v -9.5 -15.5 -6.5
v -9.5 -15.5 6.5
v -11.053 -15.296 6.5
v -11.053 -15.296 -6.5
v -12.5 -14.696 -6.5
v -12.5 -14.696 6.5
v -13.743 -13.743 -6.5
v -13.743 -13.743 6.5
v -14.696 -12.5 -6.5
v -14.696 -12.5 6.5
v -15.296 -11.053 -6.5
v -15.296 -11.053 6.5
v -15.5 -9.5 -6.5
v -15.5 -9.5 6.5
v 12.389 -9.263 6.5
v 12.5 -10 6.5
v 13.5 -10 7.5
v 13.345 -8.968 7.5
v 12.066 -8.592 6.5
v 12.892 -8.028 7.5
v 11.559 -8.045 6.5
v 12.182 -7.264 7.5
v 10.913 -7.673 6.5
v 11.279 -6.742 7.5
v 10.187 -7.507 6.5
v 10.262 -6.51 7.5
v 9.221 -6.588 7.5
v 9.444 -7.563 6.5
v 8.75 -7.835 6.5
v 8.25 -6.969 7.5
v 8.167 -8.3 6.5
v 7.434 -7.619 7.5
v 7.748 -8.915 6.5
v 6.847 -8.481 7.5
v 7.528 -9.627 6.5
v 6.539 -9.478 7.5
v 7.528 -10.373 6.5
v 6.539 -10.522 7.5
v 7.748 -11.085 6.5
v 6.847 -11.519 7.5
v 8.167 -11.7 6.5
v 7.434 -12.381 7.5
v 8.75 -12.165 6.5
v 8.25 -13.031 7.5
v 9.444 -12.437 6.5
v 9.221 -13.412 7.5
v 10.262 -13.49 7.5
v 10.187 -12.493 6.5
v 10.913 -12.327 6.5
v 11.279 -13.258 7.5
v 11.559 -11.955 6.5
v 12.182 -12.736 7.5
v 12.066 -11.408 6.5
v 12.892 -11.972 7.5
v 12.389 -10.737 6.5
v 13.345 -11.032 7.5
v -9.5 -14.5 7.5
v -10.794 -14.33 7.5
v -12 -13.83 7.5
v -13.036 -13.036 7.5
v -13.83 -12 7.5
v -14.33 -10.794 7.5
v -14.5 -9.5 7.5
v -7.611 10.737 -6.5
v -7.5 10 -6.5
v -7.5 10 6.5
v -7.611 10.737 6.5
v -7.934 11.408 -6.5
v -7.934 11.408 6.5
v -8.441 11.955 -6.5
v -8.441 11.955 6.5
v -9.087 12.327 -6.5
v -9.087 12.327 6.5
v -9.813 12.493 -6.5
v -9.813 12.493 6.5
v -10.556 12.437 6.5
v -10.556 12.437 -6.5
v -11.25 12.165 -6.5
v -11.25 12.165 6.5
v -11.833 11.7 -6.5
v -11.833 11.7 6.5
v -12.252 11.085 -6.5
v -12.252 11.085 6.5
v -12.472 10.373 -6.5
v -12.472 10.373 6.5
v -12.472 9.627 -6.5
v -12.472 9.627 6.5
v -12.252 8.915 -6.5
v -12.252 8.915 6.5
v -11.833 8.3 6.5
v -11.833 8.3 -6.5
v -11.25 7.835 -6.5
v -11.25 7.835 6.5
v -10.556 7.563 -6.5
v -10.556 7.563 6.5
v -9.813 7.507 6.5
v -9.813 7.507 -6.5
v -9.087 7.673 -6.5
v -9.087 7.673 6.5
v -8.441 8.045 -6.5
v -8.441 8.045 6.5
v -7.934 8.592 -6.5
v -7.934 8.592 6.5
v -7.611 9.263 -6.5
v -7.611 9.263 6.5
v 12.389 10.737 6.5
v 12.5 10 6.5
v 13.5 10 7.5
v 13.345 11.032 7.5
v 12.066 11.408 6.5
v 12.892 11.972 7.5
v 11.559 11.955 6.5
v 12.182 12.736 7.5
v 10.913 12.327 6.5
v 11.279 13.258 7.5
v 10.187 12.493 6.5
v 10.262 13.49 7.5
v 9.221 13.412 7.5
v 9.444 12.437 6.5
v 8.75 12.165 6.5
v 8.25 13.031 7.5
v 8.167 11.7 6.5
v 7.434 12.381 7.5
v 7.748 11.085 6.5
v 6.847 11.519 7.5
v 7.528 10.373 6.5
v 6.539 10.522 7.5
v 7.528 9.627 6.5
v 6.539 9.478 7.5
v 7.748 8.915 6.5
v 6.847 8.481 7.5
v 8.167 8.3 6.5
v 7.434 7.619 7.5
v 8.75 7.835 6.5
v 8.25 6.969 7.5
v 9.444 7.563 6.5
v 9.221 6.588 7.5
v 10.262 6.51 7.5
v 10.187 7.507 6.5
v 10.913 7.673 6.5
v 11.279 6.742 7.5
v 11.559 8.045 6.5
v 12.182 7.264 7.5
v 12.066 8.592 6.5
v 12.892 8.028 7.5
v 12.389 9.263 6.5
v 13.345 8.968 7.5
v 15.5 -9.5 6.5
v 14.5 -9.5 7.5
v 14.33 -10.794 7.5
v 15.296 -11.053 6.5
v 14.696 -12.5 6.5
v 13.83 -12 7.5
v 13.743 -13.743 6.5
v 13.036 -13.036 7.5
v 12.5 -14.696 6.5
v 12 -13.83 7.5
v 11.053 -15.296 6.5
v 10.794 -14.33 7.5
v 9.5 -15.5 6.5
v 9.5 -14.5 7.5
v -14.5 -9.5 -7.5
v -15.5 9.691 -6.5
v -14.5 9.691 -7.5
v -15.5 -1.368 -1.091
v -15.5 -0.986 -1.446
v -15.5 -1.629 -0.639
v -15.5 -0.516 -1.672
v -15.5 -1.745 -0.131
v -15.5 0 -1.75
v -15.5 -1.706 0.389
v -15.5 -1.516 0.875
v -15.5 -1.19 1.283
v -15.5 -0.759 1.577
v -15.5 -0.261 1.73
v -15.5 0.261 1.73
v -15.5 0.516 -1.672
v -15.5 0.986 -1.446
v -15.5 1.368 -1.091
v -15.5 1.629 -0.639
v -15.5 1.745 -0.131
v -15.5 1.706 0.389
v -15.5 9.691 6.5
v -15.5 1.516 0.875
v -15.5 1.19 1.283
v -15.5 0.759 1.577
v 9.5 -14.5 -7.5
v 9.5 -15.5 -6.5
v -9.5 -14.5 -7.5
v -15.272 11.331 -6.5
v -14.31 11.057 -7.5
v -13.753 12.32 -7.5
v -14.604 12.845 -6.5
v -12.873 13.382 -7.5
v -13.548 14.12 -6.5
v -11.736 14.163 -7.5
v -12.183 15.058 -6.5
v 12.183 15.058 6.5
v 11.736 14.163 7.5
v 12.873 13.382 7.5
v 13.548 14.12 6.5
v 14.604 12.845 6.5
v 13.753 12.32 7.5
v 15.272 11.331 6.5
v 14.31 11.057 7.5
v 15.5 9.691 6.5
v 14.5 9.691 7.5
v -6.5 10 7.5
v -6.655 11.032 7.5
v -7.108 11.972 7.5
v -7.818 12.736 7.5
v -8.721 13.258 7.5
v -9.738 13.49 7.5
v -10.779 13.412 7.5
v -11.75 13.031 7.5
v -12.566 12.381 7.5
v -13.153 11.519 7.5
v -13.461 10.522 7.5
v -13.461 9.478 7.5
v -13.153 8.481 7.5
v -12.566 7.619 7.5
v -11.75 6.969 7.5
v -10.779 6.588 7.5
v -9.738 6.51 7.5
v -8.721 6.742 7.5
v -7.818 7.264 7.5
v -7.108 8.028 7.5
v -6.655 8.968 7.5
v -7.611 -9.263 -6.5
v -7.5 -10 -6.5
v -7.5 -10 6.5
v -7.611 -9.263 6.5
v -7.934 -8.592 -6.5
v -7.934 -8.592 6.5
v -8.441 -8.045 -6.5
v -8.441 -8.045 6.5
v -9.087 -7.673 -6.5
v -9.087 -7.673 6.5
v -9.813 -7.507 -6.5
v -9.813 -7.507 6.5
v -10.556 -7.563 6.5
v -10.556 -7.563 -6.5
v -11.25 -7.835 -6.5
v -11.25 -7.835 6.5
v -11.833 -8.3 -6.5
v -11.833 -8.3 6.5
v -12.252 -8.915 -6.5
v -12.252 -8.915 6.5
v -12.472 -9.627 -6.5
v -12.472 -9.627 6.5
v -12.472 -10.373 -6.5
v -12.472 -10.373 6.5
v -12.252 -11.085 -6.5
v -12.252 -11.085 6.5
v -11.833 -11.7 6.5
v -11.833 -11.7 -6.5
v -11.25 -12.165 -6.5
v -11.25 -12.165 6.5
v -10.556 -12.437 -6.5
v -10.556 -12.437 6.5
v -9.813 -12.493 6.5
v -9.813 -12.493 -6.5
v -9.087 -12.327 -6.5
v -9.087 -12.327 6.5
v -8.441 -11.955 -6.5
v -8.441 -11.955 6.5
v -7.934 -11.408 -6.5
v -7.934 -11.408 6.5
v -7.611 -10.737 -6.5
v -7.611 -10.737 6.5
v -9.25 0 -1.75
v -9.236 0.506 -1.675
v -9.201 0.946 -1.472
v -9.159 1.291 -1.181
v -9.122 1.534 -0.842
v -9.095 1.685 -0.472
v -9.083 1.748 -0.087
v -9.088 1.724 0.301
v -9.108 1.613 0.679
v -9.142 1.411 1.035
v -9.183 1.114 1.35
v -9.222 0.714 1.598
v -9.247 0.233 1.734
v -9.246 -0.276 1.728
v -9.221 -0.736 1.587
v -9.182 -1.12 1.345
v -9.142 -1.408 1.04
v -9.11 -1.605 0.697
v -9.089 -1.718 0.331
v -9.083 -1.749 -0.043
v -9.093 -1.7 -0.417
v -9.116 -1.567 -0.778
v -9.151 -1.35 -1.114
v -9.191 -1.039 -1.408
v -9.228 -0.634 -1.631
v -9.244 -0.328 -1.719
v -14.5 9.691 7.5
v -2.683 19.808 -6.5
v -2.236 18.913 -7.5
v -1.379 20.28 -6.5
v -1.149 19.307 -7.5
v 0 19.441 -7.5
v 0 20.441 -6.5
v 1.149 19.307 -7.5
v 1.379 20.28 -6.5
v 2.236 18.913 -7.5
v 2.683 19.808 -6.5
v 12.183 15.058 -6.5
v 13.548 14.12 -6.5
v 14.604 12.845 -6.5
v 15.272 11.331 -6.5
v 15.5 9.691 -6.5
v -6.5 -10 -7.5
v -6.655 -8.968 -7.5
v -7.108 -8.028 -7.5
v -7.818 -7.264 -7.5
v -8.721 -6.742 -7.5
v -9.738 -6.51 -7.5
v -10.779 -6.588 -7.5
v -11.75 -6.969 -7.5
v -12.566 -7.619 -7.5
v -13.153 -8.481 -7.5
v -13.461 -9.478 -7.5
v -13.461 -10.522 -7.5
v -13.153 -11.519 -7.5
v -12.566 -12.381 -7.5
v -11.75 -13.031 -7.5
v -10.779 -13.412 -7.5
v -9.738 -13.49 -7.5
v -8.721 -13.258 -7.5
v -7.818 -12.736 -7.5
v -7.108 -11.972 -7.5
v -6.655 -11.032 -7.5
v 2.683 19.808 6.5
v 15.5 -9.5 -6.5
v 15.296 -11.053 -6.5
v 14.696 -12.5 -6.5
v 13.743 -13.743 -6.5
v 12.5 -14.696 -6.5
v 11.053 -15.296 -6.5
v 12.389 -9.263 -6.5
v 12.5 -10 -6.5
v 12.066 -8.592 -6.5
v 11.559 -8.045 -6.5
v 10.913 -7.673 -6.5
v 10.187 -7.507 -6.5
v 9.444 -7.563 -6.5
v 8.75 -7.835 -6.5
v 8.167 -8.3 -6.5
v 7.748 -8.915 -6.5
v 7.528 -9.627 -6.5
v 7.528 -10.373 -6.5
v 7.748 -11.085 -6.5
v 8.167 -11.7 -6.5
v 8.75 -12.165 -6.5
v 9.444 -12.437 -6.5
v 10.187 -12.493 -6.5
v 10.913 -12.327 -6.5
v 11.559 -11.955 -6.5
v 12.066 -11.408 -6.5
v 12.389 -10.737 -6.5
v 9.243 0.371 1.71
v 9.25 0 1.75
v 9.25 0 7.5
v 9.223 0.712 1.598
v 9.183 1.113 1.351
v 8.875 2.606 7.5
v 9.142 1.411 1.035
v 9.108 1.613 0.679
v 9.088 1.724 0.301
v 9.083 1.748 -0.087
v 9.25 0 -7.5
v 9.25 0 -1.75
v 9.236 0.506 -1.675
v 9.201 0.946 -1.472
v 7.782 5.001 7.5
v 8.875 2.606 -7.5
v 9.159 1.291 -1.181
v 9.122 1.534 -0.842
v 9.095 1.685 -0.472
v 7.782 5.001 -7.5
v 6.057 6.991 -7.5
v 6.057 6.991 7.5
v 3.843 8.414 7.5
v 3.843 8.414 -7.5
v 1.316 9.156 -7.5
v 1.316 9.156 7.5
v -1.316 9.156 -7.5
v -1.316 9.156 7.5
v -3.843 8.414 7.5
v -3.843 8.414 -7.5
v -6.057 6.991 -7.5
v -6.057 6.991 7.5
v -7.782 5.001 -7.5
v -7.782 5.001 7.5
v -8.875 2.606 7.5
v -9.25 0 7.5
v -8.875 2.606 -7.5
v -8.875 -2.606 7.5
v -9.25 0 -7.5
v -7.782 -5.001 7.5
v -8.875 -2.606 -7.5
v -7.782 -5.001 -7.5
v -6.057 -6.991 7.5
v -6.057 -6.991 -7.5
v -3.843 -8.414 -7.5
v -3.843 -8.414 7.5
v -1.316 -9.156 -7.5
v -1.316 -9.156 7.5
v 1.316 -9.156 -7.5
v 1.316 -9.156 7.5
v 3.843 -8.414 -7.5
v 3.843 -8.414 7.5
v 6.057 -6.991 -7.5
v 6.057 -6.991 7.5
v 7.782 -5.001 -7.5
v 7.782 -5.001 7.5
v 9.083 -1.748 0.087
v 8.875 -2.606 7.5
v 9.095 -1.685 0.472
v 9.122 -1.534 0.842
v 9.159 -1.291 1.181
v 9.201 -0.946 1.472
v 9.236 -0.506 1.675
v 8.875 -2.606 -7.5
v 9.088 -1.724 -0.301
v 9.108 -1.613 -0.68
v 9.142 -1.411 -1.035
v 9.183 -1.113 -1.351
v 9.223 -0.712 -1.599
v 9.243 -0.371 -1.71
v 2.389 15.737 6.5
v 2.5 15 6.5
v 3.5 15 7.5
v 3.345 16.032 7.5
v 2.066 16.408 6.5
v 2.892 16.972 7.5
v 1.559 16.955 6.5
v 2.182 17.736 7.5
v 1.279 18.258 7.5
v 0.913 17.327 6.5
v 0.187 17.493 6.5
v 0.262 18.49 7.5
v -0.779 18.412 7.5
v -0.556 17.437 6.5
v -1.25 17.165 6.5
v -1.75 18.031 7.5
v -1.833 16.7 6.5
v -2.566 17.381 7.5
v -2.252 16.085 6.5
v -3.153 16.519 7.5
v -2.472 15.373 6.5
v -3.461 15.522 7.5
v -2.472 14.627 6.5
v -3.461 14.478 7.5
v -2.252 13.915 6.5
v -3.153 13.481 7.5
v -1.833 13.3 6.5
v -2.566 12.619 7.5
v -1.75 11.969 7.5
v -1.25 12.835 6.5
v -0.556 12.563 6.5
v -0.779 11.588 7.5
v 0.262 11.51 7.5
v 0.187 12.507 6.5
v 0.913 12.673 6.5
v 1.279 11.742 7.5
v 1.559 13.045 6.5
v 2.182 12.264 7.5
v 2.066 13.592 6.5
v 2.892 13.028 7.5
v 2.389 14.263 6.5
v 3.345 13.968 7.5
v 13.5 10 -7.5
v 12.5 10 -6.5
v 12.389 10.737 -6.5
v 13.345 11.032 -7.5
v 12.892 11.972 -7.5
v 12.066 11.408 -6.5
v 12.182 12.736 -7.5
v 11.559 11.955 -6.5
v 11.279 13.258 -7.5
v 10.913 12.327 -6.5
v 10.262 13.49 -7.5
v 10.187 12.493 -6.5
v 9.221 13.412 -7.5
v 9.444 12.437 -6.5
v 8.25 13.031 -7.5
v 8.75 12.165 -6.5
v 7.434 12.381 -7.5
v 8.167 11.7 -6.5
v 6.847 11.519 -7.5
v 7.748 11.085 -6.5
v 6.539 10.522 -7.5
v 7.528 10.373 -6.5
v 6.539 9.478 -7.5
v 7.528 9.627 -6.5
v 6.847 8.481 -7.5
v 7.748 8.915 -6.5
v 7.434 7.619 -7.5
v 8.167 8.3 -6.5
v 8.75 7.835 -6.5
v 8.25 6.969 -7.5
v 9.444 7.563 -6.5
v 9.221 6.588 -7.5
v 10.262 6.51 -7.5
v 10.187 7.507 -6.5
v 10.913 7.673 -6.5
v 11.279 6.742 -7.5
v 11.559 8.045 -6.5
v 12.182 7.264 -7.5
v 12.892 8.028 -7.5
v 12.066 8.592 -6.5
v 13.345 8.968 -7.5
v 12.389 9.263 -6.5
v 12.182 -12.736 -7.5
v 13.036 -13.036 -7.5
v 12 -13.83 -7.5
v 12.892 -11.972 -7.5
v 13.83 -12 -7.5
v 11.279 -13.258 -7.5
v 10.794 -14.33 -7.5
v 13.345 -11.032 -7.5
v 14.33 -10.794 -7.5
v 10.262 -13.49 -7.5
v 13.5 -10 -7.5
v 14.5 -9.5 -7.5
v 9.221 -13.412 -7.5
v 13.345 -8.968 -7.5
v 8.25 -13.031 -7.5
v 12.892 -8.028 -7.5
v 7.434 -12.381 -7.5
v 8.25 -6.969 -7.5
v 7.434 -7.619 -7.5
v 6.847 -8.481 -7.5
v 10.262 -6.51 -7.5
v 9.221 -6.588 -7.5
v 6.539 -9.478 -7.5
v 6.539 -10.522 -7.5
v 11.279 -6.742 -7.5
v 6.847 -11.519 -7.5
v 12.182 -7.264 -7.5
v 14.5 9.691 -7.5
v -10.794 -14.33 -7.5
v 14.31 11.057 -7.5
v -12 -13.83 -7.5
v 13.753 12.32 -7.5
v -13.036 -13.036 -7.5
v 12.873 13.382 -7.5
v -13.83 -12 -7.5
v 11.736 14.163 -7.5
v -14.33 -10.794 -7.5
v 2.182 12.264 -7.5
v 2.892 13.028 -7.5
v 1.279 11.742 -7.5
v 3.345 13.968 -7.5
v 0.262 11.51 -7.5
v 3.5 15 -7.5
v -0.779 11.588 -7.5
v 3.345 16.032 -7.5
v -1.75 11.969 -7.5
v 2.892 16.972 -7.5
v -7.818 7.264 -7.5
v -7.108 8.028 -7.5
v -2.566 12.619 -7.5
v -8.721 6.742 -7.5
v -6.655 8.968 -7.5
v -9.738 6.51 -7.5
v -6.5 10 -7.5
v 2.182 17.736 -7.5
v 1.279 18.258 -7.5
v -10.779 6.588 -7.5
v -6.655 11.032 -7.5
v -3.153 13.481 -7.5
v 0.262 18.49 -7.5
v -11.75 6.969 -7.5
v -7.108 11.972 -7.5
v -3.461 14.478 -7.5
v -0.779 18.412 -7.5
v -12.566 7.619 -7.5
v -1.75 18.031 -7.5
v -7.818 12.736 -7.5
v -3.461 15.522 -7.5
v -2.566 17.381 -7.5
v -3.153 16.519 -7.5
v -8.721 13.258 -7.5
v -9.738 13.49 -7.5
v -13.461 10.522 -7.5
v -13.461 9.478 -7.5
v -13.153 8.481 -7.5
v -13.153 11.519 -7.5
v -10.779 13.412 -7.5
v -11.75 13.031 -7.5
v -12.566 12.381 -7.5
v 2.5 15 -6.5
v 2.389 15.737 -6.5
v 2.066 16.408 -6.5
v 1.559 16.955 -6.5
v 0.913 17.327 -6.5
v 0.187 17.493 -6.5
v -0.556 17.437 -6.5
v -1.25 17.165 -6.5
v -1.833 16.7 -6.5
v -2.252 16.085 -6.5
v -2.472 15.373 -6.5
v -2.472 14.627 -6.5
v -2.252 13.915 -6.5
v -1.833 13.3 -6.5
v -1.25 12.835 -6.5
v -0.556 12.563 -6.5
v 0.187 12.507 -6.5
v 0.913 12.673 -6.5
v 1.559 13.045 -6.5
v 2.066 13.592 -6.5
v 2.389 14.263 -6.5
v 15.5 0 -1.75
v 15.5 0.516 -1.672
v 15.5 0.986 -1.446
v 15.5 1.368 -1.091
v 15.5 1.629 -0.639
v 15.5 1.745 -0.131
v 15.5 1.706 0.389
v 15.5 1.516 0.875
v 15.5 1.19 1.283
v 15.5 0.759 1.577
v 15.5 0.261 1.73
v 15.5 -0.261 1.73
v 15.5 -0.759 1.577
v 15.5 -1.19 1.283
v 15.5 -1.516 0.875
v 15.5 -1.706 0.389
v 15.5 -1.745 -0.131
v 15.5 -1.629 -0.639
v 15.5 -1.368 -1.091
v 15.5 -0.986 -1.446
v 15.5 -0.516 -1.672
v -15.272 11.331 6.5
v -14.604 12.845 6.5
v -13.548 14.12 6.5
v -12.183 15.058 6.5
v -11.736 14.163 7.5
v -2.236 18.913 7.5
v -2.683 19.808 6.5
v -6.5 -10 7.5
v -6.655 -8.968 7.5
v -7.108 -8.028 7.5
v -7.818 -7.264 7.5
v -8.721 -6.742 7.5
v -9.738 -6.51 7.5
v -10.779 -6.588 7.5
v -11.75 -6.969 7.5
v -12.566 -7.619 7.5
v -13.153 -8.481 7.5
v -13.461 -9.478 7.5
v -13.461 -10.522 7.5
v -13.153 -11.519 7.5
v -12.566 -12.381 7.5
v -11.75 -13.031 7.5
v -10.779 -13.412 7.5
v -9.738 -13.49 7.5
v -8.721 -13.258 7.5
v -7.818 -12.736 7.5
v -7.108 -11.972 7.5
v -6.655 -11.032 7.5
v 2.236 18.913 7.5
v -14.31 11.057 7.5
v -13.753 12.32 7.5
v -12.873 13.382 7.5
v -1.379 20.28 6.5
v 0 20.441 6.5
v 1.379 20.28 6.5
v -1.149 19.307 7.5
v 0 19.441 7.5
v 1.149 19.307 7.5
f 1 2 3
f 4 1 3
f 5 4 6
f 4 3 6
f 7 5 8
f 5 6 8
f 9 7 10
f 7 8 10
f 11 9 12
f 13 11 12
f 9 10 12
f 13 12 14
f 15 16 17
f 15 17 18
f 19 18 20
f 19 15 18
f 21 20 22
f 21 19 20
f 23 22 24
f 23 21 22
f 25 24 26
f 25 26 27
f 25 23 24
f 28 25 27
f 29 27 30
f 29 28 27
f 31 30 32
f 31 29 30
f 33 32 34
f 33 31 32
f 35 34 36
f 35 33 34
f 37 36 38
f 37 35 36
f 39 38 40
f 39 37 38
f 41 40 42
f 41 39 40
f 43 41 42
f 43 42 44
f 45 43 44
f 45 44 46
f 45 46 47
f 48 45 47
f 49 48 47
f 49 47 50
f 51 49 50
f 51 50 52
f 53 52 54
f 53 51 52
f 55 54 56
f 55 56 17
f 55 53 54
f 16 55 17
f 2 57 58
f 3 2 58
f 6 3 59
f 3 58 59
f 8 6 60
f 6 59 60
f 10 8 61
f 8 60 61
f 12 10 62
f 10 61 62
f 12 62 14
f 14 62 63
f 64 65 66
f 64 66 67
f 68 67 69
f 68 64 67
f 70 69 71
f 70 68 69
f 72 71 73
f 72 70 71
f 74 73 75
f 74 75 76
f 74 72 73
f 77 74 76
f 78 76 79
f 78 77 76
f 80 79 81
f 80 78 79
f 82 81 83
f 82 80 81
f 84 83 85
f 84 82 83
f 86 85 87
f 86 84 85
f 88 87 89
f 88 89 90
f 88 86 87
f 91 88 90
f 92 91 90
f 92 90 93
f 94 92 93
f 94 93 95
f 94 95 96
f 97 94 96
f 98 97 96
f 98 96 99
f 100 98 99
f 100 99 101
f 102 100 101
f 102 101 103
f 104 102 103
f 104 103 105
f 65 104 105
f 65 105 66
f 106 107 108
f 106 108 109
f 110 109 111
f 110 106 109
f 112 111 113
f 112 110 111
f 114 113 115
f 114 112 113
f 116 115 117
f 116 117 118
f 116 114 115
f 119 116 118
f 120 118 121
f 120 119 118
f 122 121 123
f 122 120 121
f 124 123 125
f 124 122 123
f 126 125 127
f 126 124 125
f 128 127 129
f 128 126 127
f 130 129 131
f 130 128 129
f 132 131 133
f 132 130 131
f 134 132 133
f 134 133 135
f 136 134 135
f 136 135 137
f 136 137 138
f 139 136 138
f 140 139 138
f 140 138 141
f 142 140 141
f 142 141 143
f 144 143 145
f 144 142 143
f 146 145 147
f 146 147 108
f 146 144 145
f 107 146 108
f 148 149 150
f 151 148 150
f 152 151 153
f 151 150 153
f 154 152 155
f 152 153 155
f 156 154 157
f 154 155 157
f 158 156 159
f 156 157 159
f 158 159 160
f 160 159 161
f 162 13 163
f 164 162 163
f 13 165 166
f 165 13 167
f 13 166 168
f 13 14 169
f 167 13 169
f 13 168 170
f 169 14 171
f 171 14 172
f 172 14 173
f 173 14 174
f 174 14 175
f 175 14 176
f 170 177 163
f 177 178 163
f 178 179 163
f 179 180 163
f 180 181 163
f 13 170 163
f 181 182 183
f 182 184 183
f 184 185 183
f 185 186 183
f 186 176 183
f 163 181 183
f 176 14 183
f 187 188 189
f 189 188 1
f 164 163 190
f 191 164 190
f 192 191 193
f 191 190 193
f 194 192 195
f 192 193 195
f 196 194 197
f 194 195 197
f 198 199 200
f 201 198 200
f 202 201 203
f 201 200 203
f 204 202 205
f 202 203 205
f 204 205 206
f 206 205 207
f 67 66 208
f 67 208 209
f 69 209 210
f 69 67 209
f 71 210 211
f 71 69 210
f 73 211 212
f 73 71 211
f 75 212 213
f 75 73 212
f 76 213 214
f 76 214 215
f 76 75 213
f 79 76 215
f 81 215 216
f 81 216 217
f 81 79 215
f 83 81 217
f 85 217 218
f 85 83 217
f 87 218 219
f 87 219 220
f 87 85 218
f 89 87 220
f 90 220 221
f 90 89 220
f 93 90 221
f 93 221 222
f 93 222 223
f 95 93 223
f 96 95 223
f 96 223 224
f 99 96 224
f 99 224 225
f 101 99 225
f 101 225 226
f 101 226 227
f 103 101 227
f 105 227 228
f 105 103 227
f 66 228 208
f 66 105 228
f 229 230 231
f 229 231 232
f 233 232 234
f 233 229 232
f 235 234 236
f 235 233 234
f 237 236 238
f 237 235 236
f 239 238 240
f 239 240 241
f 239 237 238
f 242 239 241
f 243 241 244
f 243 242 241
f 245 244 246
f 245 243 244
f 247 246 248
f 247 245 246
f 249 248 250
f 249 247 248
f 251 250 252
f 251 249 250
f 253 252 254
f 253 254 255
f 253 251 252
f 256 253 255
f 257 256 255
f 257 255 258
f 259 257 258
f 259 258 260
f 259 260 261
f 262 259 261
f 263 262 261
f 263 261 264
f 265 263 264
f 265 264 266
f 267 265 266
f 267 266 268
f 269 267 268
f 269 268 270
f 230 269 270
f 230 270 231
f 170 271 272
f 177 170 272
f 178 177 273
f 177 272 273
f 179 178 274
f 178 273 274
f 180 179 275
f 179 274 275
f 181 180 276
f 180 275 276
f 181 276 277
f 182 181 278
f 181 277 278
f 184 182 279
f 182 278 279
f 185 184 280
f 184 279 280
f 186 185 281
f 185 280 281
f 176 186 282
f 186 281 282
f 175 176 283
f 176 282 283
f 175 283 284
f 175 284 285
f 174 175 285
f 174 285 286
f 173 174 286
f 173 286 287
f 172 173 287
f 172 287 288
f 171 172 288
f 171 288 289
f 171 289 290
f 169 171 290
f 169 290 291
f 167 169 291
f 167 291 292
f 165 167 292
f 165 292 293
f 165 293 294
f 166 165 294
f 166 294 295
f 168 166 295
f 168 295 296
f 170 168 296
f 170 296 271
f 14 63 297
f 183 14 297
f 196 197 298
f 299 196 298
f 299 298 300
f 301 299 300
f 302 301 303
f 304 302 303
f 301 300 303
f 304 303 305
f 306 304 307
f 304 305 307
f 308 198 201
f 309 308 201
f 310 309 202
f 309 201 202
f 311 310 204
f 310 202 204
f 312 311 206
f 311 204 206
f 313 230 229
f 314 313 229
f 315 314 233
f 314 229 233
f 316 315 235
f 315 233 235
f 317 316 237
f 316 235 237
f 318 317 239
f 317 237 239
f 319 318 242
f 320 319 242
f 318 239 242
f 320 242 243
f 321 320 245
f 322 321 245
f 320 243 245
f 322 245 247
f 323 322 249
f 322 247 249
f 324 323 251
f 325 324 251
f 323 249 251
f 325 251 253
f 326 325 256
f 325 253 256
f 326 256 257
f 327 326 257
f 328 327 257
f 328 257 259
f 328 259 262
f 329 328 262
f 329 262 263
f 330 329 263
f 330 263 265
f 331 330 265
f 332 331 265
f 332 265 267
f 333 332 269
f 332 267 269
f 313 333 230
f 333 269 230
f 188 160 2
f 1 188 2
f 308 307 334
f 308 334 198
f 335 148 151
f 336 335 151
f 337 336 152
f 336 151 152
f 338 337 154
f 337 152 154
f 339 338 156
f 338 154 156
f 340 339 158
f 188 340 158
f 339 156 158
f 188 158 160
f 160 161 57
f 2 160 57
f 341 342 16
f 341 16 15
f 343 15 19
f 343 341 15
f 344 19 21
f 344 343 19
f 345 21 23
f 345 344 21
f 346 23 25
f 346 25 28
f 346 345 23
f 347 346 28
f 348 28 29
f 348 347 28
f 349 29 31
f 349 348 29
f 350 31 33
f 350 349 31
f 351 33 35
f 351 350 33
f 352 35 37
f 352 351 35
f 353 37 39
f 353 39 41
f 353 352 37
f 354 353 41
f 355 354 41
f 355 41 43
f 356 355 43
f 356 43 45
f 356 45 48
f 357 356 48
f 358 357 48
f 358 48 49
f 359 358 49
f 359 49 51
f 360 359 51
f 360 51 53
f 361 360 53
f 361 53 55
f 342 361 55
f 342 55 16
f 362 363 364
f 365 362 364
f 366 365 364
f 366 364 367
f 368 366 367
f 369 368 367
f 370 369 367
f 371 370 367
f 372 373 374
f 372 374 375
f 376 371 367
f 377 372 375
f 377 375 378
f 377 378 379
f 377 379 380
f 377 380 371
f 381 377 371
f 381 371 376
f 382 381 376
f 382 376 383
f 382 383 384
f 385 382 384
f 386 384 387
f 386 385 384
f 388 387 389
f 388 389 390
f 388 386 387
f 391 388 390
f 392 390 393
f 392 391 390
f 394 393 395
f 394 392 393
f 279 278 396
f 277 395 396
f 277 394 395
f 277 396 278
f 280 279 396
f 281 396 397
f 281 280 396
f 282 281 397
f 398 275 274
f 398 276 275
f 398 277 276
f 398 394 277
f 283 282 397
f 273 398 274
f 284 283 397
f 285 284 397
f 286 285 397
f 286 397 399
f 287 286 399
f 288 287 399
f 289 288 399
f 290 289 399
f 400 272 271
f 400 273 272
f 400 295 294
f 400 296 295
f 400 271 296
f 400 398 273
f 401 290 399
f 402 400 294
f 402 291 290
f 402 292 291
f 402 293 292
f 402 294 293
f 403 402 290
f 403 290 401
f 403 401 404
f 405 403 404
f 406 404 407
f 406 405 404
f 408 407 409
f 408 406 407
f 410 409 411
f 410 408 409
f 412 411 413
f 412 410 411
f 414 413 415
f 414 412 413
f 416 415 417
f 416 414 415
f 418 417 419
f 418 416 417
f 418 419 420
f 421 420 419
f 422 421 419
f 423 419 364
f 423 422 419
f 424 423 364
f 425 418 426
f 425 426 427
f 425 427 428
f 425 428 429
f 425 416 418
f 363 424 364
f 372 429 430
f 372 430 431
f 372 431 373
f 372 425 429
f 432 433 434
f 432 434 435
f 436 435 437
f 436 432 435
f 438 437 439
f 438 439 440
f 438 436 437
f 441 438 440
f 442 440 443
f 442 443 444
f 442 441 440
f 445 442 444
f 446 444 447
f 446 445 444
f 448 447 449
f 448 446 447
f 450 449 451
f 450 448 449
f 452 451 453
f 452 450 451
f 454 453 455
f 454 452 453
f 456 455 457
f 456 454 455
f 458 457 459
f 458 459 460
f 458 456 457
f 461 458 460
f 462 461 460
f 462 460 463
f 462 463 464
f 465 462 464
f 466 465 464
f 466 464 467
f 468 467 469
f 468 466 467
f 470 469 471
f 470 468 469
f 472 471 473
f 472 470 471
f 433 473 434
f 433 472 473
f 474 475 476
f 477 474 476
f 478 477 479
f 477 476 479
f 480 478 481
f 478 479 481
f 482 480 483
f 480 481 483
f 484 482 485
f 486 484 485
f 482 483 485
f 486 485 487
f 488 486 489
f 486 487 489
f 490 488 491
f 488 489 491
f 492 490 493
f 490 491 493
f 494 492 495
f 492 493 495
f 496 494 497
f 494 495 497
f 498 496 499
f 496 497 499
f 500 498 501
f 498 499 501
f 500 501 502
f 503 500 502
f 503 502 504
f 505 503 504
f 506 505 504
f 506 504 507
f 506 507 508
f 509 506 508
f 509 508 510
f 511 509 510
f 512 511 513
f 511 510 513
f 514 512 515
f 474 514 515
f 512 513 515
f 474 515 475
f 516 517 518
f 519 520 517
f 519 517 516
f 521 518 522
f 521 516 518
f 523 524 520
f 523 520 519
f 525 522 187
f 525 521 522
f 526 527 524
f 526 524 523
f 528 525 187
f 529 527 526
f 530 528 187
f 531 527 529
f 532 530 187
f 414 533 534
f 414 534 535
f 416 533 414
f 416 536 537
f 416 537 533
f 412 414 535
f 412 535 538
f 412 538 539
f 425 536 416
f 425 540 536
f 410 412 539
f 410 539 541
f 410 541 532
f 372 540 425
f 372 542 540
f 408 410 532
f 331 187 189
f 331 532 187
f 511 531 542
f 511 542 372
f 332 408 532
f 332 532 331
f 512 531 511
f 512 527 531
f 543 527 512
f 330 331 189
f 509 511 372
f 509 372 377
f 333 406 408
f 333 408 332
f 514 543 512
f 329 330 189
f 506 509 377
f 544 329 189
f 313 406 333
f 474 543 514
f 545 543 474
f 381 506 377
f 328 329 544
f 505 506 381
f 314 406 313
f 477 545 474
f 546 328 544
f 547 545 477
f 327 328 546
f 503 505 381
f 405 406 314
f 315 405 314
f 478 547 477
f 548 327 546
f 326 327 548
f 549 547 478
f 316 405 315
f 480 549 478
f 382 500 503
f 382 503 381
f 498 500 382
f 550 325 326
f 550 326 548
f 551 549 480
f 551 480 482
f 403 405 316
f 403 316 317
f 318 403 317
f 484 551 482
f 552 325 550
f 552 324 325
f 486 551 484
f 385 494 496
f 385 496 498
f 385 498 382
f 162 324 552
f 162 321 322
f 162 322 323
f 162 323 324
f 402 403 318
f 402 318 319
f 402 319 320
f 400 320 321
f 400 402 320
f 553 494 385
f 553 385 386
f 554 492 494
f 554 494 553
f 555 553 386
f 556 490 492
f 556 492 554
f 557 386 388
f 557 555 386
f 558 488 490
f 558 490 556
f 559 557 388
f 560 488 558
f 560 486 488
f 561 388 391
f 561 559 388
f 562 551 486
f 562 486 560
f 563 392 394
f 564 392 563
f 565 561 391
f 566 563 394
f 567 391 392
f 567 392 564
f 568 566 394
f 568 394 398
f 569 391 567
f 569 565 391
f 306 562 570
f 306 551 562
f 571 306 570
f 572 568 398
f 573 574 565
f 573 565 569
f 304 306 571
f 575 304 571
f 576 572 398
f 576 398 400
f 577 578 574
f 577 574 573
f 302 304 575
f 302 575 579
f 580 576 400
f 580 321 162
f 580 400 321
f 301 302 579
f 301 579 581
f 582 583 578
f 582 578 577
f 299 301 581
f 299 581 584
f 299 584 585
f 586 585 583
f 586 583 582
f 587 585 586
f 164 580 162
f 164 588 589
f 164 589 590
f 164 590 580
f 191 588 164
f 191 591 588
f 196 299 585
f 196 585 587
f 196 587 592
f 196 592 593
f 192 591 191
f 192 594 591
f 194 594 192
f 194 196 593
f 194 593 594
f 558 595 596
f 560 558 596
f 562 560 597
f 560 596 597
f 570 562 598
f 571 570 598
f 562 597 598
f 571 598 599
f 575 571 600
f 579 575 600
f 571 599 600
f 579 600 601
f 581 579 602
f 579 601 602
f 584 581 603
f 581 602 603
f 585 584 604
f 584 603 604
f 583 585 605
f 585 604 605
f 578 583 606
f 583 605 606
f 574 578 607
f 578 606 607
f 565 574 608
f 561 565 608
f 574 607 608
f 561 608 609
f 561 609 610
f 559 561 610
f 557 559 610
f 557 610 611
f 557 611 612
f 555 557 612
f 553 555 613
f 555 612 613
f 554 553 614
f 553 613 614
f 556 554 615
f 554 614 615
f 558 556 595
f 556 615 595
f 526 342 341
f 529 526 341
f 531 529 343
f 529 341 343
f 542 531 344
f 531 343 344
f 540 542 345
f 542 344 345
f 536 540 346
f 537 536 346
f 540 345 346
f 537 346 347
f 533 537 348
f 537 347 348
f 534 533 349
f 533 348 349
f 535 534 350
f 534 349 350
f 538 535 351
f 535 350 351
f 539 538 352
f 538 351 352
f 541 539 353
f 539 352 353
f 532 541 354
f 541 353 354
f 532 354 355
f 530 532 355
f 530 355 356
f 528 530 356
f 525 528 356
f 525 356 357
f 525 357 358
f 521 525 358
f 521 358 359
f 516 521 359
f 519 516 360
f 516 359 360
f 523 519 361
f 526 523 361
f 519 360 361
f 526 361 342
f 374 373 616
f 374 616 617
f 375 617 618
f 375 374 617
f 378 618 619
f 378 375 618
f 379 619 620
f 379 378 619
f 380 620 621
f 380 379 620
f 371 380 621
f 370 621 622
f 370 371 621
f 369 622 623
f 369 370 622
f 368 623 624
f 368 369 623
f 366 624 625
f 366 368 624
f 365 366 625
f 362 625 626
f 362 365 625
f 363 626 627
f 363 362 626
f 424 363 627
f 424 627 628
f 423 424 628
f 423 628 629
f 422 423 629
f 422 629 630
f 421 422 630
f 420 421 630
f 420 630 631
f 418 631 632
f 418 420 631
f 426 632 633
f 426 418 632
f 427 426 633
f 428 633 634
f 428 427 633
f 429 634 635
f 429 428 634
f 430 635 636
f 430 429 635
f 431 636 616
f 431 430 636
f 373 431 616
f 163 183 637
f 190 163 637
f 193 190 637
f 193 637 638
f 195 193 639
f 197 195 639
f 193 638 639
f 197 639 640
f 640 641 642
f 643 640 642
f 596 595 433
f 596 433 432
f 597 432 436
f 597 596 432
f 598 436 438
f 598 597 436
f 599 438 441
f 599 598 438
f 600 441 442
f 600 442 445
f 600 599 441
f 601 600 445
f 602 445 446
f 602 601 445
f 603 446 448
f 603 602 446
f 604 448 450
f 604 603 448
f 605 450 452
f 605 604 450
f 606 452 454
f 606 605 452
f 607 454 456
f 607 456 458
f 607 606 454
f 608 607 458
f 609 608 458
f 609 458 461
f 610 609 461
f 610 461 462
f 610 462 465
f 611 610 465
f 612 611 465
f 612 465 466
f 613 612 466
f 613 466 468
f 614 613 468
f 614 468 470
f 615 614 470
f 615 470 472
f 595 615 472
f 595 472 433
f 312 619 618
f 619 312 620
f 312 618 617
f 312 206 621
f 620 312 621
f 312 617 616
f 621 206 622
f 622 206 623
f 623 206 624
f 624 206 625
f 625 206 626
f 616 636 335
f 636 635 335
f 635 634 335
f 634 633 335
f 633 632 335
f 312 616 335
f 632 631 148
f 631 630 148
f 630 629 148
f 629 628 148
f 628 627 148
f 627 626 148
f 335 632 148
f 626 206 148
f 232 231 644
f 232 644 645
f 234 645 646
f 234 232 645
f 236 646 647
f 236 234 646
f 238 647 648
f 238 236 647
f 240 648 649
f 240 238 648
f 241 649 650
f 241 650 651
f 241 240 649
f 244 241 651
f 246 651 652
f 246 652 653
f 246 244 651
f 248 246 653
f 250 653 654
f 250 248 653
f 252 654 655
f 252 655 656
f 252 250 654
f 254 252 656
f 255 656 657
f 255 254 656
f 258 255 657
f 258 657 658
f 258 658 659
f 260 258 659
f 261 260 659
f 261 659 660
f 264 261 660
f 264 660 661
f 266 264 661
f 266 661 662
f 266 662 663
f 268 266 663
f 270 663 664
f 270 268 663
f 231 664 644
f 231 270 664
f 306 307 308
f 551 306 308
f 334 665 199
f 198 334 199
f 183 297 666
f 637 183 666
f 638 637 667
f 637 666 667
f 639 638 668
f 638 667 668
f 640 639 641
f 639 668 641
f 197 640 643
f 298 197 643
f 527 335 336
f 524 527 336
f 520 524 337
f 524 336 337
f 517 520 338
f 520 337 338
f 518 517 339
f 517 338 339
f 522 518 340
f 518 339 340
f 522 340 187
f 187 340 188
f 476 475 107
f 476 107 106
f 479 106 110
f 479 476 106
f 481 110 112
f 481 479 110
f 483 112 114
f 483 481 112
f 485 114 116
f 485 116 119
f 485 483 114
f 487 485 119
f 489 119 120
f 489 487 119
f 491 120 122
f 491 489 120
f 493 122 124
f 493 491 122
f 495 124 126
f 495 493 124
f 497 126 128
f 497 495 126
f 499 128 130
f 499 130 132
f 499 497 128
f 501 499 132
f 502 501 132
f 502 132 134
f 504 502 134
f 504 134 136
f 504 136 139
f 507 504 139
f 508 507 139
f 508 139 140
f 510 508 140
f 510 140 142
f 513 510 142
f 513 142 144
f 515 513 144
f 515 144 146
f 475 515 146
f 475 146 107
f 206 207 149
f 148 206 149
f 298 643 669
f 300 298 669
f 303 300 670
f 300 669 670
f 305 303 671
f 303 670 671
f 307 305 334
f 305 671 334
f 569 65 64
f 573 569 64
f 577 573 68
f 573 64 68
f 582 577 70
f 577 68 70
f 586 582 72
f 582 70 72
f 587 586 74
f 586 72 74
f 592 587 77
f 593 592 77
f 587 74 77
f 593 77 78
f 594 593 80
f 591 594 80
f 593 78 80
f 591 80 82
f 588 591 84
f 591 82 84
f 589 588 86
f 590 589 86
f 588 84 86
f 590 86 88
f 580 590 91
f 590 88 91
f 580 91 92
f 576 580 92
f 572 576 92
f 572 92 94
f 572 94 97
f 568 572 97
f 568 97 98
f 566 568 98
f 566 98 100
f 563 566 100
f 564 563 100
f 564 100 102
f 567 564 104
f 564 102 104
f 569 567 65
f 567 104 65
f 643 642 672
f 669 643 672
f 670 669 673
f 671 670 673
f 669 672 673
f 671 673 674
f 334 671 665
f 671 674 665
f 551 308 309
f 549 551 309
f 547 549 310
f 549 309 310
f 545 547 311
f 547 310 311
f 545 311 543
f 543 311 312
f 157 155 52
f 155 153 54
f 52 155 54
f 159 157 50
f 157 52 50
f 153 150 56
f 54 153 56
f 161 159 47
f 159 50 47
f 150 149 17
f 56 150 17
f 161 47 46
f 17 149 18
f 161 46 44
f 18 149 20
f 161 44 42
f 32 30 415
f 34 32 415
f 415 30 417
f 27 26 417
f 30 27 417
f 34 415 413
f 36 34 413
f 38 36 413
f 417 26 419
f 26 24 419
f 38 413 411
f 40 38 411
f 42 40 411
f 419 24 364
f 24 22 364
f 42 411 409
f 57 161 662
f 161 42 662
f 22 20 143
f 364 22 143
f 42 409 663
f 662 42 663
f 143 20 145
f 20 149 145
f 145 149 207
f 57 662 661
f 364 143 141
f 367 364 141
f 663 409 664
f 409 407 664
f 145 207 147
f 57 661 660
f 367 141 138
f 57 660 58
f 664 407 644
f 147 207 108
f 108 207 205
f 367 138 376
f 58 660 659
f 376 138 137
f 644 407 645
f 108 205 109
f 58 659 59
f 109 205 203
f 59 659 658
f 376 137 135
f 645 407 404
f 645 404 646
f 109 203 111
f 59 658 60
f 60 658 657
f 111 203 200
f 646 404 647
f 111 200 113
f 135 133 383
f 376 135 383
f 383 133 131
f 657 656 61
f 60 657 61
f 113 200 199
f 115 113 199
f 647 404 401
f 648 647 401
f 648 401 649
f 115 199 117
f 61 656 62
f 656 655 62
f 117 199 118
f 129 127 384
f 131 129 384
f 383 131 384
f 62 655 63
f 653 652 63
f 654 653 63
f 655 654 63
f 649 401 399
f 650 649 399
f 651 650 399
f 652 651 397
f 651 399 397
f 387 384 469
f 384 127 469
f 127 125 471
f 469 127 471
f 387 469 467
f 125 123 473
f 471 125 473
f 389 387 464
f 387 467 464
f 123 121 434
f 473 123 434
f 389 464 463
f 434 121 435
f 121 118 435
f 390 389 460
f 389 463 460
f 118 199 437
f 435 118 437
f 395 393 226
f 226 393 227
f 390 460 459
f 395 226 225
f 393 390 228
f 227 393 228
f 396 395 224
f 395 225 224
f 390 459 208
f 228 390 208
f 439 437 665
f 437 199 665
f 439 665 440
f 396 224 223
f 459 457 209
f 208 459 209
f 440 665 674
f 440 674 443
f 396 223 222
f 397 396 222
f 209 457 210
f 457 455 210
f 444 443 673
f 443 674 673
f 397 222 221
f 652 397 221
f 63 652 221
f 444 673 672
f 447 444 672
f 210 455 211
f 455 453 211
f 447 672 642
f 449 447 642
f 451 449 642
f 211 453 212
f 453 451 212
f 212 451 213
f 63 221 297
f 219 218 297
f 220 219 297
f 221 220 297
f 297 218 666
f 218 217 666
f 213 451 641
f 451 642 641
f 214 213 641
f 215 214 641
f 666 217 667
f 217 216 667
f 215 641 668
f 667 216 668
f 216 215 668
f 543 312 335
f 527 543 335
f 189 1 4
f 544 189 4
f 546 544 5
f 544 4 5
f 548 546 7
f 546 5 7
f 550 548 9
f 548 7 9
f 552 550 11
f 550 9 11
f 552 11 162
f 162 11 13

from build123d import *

# Parameters (mm, degrees)
SKETCH_1_R               = 9.25
SKETCH_1_R_2             = 2.5
EXTRUDE_1_DEPTH          = 7.5
SKETCH_3_R               = 1.75
CUT_EXTRUDE_1_DEPTH      = 16.5
CUT_EXTRUDE_1_DEPTH_BACK = 16.5
CHAMFER_1_SIZE           = 1
CHAMFER_2_SIZE           = 1


with BuildPart() as part:
    # ｽｹｯﾁ1 → ﾎﾞｽ - 押し出し1 (new body, symmetric)
    with BuildSketch(Plane.XY):
        with BuildLine():
            Line((2.683281573, 19.807546152), (12.183281573, 15.057546152))
            ThreePointArc((12.183281573, 15.057546152), (14.60390485, 12.845369678), (15.5, 9.690983006))
            Line((15.5, 9.690983006), (15.5, -9.5))
            ThreePointArc((15.5, -9.5), (13.742640687, -13.742640687), (9.5, -15.5))
            Line((9.5, -15.5), (-9.5, -15.5))
            ThreePointArc((-9.5, -15.5), (-13.742640687, -13.742640687), (-15.5, -9.5))
            Line((-15.5, -9.5), (-15.5, 9.690983006))
            ThreePointArc((-15.5, 9.690983006), (-14.60390485, 12.845369678), (-12.183281573, 15.057546152))
            Line((-12.183281573, 15.057546152), (-2.683281573, 19.807546152))
            ThreePointArc((-2.683281573, 19.807546152), (0, 20.440983006), (2.683281573, 19.807546152))
        make_face()
        Circle(SKETCH_1_R, mode=Mode.SUBTRACT)
        with Locations((-10, -10)):
            Circle(SKETCH_1_R_2, mode=Mode.SUBTRACT)
        with Locations((-10, 10)):
            Circle(SKETCH_1_R_2, mode=Mode.SUBTRACT)
        with Locations((10, 10)):
            Circle(SKETCH_1_R_2, mode=Mode.SUBTRACT)
        with Locations((10, -10)):
            Circle(SKETCH_1_R_2, mode=Mode.SUBTRACT)
        with Locations((0, 15)):
            Circle(SKETCH_1_R_2, mode=Mode.SUBTRACT)
    extrude(amount=EXTRUDE_1_DEPTH, both=True)

    # ｽｹｯﾁ3 → ｶｯﾄ - 押し出し1 (cut, two sides)
    with BuildSketch(Plane(origin=(0, 0, 0), x_dir=(0, 0, -1), z_dir=(1, 0, 0))) as cut_extrude_1_sk:
        Circle(SKETCH_3_R)
    extrude(amount=CUT_EXTRUDE_1_DEPTH, mode=Mode.SUBTRACT)
    extrude(cut_extrude_1_sk.sketch, amount=-CUT_EXTRUDE_1_DEPTH_BACK, mode=Mode.SUBTRACT)

    # 面取り1
    chamfer_1_edges = [part.edges().sort_by_distance(p)[0] for p in [
        (-12.5, -10, -7.5),
        (-12.5, -10, 7.5),
        (-12.5, 10, -7.5),
        (-12.5, 10, 7.5),
        (7.5, 10, -7.5),
        (7.5, 10, 7.5),
        (7.5, -10, -7.5),
        (7.5, -10, 7.5),
        (-2.5, 15, -7.5),
        (-2.5, 15, 7.5),
    ]]
    chamfer(chamfer_1_edges, length=CHAMFER_1_SIZE)

    # 面取り2
    chamfer_2_edges = [part.edges().sort_by_distance(p)[0] for p in [
        (-15.5, 0.095491503, -7.5),
        (-14.60390485, 12.845369678, -7.5),
        (-7.433281573, 17.432546152, -7.5),
        (0, 20.440983006, -7.5),
        (7.433281573, 17.432546152, -7.5),
        (14.60390485, 12.845369678, -7.5),
        (15.5, 0.095491503, -7.5),
        (13.742640687, -13.742640687, 7.5),
        (13.742640687, -13.742640687, -7.5),
        (0, -15.5, -7.5),
        (-13.742640687, -13.742640687, -7.5),
        (15.5, 0.095491503, 7.5),
        (14.60390485, 12.845369678, 7.5),
        (7.433281573, 17.432546152, 7.5),
        (0, 20.440983006, 7.5),
        (-7.433281573, 17.432546152, 7.5),
        (-14.60390485, 12.845369678, 7.5),
        (-15.5, 0.095491503, 7.5),
        (-13.742640687, -13.742640687, 7.5),
        (0, -15.5, 7.5),
    ]]
    chamfer(chamfer_2_edges, length=CHAMFER_2_SIZE)


solid = part.part
